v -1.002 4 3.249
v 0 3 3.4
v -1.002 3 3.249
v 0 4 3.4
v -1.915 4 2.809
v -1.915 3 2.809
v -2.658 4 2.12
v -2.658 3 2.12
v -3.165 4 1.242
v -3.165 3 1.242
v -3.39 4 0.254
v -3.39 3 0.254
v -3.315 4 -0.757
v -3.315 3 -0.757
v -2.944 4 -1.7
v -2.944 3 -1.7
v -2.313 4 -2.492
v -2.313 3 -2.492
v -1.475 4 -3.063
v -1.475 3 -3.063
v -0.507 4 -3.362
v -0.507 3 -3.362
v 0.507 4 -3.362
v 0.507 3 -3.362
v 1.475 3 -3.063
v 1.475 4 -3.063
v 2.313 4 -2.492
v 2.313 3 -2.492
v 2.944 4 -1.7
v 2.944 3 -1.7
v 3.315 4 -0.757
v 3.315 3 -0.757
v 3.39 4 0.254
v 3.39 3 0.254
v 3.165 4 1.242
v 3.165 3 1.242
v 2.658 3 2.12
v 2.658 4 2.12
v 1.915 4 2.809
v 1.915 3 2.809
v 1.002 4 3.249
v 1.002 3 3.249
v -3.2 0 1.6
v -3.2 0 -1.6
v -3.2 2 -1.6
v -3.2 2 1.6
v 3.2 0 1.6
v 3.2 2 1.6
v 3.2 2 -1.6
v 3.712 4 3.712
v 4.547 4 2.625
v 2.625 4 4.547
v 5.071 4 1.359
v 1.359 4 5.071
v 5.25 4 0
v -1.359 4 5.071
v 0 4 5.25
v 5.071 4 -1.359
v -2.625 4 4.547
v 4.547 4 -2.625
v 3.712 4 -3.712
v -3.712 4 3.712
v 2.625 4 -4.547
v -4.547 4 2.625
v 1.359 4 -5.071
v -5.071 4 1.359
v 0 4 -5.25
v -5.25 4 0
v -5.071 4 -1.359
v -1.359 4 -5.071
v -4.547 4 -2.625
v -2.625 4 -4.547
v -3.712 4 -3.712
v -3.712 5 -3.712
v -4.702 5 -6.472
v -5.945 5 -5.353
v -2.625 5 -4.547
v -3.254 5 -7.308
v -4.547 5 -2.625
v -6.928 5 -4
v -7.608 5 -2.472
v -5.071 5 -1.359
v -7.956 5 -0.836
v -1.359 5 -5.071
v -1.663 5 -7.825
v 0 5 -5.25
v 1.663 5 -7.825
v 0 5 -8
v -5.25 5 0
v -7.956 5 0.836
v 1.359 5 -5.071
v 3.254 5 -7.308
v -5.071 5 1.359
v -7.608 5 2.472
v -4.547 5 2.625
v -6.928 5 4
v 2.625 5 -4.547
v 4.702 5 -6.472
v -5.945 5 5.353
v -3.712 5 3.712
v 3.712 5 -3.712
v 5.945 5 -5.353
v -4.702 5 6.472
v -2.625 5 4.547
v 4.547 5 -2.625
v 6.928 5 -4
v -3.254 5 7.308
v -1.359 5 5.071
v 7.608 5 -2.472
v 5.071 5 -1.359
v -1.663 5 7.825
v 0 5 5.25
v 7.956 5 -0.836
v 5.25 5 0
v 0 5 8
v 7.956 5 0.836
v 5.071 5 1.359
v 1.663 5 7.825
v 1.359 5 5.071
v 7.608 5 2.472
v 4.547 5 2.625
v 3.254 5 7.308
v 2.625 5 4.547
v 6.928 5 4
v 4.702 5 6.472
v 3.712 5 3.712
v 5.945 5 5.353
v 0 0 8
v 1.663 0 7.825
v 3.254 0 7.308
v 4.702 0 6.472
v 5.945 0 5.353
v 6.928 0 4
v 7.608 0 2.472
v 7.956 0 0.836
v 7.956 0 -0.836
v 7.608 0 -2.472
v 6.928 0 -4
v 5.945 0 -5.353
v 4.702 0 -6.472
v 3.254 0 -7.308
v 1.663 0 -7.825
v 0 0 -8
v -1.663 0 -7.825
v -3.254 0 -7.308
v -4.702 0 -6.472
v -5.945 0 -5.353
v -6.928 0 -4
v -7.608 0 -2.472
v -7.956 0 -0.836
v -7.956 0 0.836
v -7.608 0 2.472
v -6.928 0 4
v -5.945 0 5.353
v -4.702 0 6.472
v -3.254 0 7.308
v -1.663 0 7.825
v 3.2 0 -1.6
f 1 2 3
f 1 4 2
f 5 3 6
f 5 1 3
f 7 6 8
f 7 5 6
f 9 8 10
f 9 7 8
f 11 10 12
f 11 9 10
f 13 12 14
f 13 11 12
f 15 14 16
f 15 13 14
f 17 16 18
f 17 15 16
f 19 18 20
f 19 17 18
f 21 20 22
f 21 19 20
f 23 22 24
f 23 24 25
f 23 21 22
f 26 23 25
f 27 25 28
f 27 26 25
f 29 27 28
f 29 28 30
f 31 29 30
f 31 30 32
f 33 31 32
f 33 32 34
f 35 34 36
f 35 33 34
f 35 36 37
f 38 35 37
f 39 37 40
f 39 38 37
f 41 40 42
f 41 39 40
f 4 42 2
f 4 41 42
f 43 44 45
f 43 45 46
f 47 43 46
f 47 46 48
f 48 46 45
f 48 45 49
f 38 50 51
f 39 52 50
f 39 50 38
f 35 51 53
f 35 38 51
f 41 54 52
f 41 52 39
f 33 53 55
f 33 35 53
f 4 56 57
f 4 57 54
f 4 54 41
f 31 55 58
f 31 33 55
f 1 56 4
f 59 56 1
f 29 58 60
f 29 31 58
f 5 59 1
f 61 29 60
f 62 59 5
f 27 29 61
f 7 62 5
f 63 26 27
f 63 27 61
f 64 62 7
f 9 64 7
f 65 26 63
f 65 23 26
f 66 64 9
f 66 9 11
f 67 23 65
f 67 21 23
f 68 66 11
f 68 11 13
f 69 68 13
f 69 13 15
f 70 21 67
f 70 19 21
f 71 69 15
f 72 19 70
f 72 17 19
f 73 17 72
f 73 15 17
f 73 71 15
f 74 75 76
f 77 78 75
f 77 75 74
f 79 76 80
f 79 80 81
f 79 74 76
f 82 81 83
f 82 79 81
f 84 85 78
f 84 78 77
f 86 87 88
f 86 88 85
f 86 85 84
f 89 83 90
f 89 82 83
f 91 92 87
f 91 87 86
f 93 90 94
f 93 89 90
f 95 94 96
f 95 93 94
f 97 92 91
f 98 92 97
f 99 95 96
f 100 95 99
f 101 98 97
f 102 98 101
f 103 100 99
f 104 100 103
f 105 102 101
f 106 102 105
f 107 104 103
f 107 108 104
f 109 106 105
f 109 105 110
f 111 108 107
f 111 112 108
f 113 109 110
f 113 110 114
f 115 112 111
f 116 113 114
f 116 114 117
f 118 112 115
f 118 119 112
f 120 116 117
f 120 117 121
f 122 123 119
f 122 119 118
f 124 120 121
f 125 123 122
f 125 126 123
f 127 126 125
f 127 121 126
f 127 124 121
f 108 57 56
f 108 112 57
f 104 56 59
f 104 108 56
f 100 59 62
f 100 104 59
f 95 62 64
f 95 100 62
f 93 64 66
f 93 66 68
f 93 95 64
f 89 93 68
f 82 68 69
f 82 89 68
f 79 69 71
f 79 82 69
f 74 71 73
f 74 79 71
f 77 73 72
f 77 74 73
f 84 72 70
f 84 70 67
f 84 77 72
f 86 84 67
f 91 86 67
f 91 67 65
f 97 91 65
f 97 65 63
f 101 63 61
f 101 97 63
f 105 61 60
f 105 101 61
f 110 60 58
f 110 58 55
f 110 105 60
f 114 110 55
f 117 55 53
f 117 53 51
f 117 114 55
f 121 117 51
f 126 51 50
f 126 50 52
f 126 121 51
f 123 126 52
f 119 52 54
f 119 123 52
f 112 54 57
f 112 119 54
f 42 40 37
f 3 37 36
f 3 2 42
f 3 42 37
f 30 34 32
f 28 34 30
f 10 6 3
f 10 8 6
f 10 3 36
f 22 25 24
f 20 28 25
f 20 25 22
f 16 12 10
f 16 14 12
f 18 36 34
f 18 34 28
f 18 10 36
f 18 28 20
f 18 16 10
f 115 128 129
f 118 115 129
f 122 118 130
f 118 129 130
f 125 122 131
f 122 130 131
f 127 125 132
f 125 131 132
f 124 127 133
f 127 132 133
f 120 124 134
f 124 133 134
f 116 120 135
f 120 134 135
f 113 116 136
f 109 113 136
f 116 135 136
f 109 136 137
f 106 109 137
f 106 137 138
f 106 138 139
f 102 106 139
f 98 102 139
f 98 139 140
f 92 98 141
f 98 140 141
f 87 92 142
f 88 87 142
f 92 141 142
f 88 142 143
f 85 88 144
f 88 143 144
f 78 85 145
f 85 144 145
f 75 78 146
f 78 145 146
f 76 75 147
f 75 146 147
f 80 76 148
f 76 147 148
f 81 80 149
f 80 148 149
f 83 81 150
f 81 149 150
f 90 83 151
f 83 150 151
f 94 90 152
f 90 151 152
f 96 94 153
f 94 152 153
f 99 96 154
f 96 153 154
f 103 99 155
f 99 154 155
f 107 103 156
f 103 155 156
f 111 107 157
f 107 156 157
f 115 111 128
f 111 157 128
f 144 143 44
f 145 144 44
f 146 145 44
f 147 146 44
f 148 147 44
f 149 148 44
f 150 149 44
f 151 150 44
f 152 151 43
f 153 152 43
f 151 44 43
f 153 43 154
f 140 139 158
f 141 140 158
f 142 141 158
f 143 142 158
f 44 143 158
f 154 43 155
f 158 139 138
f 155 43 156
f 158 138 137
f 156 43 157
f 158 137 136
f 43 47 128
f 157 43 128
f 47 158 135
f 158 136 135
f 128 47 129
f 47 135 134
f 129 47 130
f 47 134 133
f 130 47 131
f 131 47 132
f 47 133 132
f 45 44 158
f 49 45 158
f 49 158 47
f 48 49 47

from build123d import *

# Parameters (mm, degrees)
SKETCH1_R           = 8
BOSS_EXTRUDE1_DEPTH = 5
SKETCH2_W           = 6.4
SKETCH2_H           = 3.2
CUT_EXTRUDE1_DEPTH  = 2


with BuildPart() as part:
    # Sketch1 → Boss-Extrude1 (new body)
    with BuildSketch(Plane(origin=(0, 0, 0), x_dir=(1, 0, 0), z_dir=(0, 1, 0))):
        with Locations(Location((0, 0, 0), (0, 0, 270))):
            Circle(SKETCH1_R)
    extrude(amount=BOSS_EXTRUDE1_DEPTH)

    # Sketch2 → Cut-Extrude1 (cut)
    with BuildSketch(Plane.XZ):
        Rectangle(SKETCH2_W, SKETCH2_H)
    extrude(amount=-CUT_EXTRUDE1_DEPTH, mode=Mode.SUBTRACT)

    # Sketch3 → Cut-Revolve1 (revolve, cut)
    with BuildSketch(Plane.XY, mode=Mode.PRIVATE) as cut_revolve1_sk:
        Polygon((0, 3), (-3.4, 3), (-3.4, 4), (-5.25, 4), (-5.25, 5), (0, 5), align=None)
    revolve(cut_revolve1_sk.sketch.rotate(Axis((0, 0, 0), (0, -1, 0)), 270), axis=Axis((0, 0, 0), (0, -1, 0)), mode=Mode.SUBTRACT)


solid = part.part
